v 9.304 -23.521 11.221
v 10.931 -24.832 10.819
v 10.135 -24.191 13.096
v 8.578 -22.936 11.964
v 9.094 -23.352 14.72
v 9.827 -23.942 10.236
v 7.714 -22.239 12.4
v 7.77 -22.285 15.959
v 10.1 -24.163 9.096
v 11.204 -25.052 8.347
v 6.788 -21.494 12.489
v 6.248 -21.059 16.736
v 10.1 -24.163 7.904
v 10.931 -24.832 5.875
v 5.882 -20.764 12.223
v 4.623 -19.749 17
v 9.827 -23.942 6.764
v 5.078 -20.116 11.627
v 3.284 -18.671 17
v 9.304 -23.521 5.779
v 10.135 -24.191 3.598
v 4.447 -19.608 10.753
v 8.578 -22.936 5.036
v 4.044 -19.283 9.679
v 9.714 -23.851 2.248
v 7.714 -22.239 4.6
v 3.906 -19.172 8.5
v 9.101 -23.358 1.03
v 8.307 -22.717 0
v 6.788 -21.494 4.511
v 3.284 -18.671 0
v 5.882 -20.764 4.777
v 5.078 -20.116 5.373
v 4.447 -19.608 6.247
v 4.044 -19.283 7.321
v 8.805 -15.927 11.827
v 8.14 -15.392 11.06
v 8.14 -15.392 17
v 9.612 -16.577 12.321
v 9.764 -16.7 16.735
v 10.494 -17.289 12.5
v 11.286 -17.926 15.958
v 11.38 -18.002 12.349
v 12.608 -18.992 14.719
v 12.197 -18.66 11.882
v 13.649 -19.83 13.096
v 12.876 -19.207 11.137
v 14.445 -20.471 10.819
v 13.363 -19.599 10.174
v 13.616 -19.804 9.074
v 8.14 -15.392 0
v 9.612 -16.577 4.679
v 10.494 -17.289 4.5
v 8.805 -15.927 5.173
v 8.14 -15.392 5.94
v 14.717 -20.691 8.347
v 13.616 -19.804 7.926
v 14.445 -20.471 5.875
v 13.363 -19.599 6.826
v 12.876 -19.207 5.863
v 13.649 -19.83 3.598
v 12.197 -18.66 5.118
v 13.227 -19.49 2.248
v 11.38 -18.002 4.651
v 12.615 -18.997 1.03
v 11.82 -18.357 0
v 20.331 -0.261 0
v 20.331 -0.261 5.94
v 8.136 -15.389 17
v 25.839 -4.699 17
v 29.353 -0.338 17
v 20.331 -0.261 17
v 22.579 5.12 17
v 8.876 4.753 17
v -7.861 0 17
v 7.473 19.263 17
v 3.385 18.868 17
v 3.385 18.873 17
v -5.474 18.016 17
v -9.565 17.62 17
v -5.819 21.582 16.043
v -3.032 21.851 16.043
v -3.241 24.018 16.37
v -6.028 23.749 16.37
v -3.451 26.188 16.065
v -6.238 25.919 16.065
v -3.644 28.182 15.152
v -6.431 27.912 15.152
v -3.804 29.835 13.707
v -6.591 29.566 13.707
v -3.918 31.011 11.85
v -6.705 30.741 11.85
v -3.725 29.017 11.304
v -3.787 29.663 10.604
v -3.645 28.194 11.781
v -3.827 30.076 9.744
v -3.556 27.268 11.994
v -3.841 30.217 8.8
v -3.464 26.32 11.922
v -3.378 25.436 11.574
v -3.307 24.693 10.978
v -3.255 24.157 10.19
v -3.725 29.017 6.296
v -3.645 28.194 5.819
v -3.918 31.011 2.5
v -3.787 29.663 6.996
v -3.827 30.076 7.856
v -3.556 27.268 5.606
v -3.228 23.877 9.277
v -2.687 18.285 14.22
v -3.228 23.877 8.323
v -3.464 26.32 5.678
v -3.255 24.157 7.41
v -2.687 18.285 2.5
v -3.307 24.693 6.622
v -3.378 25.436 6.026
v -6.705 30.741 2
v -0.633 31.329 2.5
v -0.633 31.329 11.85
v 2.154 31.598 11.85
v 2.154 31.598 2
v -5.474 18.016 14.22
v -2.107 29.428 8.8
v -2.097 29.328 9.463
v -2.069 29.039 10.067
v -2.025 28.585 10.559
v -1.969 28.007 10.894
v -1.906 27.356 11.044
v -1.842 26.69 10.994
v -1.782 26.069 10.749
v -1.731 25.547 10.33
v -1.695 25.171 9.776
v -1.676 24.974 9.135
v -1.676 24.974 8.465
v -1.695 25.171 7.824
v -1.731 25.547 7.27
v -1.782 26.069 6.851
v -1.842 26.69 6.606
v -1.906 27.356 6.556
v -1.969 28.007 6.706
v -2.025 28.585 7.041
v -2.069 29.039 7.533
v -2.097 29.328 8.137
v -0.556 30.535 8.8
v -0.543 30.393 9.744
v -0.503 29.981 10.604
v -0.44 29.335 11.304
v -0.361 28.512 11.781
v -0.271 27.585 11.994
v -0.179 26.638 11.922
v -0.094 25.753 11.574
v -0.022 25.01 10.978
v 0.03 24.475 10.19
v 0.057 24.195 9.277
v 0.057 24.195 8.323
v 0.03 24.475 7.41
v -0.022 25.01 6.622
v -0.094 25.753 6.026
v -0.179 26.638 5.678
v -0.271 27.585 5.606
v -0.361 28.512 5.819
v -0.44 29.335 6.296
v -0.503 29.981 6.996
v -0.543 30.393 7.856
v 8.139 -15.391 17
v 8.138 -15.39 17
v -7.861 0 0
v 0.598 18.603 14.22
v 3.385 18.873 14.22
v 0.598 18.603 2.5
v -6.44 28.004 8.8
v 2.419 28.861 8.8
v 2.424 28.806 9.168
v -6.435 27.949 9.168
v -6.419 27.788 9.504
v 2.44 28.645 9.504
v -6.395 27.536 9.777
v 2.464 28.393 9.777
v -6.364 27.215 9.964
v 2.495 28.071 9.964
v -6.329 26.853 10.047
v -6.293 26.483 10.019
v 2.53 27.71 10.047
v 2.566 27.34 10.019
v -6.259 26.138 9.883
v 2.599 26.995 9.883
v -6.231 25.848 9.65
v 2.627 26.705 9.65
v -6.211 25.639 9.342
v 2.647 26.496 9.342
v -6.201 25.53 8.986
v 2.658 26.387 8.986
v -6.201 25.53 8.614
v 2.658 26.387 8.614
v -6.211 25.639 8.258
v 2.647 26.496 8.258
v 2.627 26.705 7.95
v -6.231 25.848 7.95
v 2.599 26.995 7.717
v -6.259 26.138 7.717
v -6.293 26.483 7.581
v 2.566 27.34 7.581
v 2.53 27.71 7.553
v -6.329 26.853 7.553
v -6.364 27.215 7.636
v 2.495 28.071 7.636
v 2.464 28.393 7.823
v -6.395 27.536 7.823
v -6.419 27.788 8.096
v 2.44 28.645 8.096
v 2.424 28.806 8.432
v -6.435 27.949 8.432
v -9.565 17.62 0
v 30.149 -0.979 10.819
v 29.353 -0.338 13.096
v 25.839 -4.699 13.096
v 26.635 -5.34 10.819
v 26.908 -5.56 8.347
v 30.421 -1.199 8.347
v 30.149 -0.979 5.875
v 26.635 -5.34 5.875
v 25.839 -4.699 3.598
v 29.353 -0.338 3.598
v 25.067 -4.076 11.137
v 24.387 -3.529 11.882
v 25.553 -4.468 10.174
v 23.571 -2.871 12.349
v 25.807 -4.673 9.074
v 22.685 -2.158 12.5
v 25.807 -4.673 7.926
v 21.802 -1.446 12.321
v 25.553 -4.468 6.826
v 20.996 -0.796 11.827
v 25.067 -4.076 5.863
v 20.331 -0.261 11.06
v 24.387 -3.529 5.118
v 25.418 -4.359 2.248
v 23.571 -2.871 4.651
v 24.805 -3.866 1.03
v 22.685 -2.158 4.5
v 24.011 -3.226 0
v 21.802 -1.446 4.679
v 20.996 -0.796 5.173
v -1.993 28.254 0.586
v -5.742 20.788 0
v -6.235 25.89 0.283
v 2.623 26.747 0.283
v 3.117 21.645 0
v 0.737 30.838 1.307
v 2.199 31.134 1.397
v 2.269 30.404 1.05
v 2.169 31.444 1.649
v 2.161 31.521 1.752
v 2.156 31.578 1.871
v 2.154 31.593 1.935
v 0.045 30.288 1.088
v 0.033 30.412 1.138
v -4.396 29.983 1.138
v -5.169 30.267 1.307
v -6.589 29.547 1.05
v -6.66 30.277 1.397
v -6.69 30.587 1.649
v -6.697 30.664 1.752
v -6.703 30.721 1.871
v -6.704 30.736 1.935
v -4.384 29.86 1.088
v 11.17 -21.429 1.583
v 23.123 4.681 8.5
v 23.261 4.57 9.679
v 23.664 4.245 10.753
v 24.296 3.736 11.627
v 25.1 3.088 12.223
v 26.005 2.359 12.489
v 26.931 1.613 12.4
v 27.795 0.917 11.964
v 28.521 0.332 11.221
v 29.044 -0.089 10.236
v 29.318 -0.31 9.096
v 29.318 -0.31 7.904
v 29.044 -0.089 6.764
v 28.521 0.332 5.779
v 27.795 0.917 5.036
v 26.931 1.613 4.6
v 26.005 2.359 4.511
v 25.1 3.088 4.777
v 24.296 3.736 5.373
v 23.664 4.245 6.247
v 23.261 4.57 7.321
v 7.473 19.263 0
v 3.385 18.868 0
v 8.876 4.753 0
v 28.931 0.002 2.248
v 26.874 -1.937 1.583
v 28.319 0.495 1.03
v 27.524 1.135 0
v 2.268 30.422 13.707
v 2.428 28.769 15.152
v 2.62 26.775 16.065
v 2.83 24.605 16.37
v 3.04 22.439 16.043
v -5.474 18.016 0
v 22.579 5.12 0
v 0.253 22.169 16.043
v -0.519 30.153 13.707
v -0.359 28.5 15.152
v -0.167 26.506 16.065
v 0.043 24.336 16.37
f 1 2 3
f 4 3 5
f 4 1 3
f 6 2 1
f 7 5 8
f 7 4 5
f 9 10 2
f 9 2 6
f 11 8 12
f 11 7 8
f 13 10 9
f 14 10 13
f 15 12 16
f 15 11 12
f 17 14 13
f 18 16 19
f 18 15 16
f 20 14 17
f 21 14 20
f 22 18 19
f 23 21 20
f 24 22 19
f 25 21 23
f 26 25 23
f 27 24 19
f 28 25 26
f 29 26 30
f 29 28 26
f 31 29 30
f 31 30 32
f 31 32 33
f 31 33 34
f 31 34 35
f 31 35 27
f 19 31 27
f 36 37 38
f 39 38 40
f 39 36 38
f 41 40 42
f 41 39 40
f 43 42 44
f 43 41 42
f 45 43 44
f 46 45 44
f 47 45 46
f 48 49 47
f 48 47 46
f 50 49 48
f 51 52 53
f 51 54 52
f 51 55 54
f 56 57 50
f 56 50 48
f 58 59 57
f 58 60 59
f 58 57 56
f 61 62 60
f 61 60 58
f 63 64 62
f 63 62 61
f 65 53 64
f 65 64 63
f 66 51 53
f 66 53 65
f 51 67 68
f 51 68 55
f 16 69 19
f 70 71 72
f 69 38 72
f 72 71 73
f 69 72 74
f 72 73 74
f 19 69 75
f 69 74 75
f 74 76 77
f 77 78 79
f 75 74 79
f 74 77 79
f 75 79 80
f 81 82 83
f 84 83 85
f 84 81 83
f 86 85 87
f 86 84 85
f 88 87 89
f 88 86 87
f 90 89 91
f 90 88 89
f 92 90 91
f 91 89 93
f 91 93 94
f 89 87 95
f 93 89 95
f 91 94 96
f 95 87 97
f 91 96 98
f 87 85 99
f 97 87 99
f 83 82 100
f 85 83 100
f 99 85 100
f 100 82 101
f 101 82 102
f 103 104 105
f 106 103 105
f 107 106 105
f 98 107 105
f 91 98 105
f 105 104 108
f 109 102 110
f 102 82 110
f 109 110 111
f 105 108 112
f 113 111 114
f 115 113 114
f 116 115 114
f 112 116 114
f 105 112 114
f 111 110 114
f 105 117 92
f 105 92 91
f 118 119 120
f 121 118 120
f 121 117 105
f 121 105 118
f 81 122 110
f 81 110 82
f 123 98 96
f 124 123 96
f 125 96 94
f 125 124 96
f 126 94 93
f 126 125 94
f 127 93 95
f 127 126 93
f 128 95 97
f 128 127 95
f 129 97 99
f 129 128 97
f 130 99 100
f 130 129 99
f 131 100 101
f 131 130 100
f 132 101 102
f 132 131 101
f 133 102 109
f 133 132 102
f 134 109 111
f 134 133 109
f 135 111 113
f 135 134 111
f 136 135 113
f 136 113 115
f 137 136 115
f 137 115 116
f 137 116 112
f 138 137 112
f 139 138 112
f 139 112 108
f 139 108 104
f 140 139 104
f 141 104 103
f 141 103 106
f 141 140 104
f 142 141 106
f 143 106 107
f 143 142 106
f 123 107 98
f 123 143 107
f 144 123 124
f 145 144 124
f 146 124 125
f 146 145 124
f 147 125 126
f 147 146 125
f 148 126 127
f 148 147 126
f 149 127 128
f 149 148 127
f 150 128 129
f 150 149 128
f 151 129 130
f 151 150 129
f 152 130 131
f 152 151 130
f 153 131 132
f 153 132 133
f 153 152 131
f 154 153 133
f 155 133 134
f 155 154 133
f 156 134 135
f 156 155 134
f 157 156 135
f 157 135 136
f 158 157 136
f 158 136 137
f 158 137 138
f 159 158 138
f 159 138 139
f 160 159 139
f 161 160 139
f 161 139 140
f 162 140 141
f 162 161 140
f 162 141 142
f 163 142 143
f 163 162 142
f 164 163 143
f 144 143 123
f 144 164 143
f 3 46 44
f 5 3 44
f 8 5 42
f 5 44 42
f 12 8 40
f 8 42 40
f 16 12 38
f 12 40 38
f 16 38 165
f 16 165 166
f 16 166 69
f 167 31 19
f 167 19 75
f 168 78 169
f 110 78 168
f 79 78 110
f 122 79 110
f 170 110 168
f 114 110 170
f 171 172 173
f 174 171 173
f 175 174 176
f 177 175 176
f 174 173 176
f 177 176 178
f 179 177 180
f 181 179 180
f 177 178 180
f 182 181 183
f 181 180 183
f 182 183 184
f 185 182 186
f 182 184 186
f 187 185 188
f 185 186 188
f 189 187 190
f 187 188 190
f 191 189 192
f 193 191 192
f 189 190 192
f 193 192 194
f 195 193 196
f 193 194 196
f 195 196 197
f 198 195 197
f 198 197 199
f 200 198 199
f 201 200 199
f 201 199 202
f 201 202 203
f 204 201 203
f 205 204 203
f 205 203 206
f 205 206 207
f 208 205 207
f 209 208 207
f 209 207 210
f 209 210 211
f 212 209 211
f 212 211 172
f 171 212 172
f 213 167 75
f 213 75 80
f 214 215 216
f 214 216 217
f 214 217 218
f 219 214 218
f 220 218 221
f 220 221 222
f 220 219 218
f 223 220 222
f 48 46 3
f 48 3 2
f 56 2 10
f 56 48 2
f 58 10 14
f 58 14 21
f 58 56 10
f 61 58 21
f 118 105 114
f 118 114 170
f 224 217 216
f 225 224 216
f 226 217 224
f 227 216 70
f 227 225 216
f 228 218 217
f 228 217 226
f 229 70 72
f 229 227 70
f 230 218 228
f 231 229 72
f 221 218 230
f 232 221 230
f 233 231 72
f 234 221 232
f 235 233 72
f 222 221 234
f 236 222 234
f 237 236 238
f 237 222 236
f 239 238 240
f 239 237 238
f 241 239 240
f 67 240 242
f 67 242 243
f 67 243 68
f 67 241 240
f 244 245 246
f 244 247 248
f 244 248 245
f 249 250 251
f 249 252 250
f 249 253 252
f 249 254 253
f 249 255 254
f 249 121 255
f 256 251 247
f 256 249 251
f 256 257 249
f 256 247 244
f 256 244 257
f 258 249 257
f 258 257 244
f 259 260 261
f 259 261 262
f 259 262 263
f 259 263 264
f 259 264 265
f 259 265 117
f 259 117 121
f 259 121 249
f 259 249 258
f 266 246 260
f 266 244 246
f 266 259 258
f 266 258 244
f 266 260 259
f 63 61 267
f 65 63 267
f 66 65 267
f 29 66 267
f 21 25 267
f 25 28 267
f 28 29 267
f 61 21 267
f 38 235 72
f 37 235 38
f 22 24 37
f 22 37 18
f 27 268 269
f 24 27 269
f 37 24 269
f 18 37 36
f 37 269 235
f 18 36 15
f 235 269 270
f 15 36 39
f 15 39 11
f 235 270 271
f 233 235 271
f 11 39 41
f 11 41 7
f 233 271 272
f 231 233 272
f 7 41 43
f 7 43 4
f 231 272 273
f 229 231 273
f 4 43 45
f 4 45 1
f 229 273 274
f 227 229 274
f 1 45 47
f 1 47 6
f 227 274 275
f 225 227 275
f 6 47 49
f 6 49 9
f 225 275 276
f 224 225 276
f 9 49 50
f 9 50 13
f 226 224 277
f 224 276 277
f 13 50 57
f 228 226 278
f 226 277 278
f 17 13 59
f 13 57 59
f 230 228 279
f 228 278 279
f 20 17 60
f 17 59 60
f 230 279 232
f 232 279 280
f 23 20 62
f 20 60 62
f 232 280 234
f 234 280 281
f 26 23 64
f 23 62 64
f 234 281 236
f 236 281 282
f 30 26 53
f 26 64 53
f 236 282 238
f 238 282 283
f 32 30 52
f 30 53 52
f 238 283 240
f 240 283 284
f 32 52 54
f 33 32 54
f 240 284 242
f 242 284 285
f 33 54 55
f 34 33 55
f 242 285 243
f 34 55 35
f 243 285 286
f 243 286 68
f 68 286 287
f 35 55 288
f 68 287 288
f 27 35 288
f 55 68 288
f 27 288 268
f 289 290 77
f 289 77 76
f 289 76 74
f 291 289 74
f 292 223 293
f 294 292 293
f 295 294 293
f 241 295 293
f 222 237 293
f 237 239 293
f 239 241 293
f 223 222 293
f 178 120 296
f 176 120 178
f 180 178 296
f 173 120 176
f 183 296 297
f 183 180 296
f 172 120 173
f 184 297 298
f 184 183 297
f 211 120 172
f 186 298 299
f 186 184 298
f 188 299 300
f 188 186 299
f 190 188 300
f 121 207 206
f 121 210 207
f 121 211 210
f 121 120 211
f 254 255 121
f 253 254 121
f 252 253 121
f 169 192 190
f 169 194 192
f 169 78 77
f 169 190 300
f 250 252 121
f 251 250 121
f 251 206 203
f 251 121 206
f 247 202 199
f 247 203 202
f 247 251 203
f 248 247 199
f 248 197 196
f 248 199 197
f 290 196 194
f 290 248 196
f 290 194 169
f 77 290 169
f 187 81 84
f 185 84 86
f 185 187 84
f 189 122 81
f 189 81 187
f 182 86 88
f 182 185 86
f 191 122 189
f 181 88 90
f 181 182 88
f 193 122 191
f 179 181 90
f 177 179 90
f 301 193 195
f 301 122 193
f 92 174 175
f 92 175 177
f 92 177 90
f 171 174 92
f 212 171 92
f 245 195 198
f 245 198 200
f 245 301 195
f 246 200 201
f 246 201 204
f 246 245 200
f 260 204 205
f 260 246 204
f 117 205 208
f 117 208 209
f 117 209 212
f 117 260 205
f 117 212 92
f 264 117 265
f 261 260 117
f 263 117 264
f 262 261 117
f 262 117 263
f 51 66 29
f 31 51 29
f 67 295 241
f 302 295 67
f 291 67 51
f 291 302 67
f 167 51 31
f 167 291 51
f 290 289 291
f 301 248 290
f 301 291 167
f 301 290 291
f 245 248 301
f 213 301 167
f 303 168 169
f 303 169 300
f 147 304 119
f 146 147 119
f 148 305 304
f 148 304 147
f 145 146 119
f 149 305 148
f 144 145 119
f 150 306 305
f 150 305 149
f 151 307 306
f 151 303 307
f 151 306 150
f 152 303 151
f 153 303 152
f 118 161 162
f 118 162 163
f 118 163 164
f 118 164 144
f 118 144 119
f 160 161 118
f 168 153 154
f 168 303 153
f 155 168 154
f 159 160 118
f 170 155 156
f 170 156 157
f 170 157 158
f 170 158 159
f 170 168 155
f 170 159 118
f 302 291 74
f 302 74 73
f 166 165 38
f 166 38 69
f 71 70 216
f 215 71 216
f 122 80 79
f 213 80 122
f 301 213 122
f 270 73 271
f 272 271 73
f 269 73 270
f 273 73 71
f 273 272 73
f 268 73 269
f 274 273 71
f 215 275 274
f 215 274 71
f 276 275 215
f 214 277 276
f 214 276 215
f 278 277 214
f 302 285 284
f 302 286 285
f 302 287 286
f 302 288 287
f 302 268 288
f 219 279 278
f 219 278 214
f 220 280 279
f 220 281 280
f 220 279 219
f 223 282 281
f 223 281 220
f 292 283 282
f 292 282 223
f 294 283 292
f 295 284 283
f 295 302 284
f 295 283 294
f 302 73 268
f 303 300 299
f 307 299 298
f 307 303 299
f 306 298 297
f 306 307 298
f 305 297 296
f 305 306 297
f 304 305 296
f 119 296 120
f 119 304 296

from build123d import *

# Parameters (mm, degrees)
BOSS_EXTRUDE1_DEPTH     = 17
CUT_EXTRUDE1_DEPTH      = 15
CUT_EXTRUDE2_DEPTH      = 46.197309304
CUT_EXTRUDE2_DEPTH_BACK = 46.197309304
CUT_EXTRUDE3_DEPTH      = 12
SKETCH6_R               = 4
CUT_EXTRUDE4_DEPTH      = 35
CUT_EXTRUDE5_START      = -12.78511231
CUT_EXTRUDE5_OUTLINE_W  = 3.3
CUT_EXTRUDE5_OUTLINE_H  = 13.870481222
CUT_EXTRUDE5_DEPTH      = 12.78511231
SKETCH8_R               = 1.25
CUT_EXTRUDE6_DEPTH      = 15
SKETCH10_R              = 1.25
CUT_EXTRUDE7_DEPTH      = 15
FILLET1_SIZE            = 2
FILLET1_SIZE_2          = 10


# Read off the part's stored shape, not the designer's step: Cut-Extrude5, Extrude-Thin1
with BuildPart() as part:
    # Sketch1 → Boss-Extrude1 (new body)
    with BuildSketch(Plane.XY):
        Polygon((-9.564728379, 17.62000192), (-5.473819301, 18.015682238), (-6.704675095, 30.741407789), (2.153984466, 31.598233783), (3.38531081, 18.867643246), (7.473335954, 19.262913811), (8.876277245, 4.753208867), (22.578615379, 5.119591375), (30.743737203, -1.458779689), (27.230396467, -5.819563663), (20.33101325, -0.260956714), (8.140408694, -15.392023407), (15.036201119, -20.947737373), (11.522860383, -25.308521347), (3.283942394, -18.670695131), (-7.860727511, 0), align=None)
    extrude(amount=BOSS_EXTRUDE1_DEPTH)

    # Sketch3 → Cut-Extrude1 (cut)
    with BuildSketch(Plane(origin=(-3.696725775, -0.357554178, 0), x_dir=(0, 0, 1), z_dir=(-0.9953550068413657, -0.09627258361457379, 0))):
        with BuildLine():
            Line((0, 31.244090554), (0, 32.721435634))
            Line((0, 32.721435634), (17.68, 32.721435634))
            Line((17.68, 32.721435634), (17.68, 18.458978244))
            Line((17.68, 18.458978244), (14.22, 18.458978244))
            Line((14.22, 18.458978244), (16.043166109, 22.04177957))
            ThreePointArc((16.043166109, 22.04177957), (15.680947079, 27.433223117), (11.85, 31.244090554))
            Line((11.85, 31.244090554), (0, 31.244090554))
        make_face()
    extrude(amount=-CUT_EXTRUDE1_DEPTH, mode=Mode.SUBTRACT)

    # Sketch4 → Cut-Extrude2 (cut, two sides: drawn at the far end of the back side and taken through both)
    with BuildSketch(Plane(origin=(7.87496966, 9.774469394, 0), x_dir=(0.7787114240648987, -0.6273822742402098, 0), z_dir=(-0.6273822742402096, -0.7787114240648986, 0)).offset(-CUT_EXTRUDE2_DEPTH_BACK)):
        Polygon((15.990906633, 19.904885529), (15.990906633, 16.999999998), (15.995711897, 16.999999998), (23.069210216, 16.999999998), (24.855711897, 17), (24.855711897, 0), (20.721010741, 0), (15.995711897, -2e-09), (15.990906633, -2e-09), (15.990906633, -2.308790515), (29.141254547, -2.308790515), (29.141254547, 19.904885529), align=None)
        with BuildLine():
            Line((24.855711897, 17), (23.069210216, 17))
            Line((23.069210216, 16.999999998), (23.069210216, 13.096000073))
            ThreePointArc((23.069210216, 13.096000073), (24.441573822, 8.347001118), (23.069216362, 3.598000386))
            add(Edge.make_bspline(
                [(20.721010741, -2e-09), (22.390075827, 1.367964254), (23.069216362, 3.598000386)],
                knots=[0, 0, 0, 1, 1, 1], degree=2))
            Line((20.721010741, 0), (24.855711897, 0))
            Line((24.855711897, 0), (24.855711897, 17))
        make_face()
    extrude(amount=CUT_EXTRUDE2_DEPTH + CUT_EXTRUDE2_DEPTH_BACK, mode=Mode.SUBTRACT)

    # Sketch5 → Cut-Extrude3 (cut)
    with BuildSketch(Plane(origin=(-4.315634896, -5.356597299, 0), x_dir=(0.7787114240649037, -0.6273822742402033, 0), z_dir=(0.6273822742402033, 0.7787114240649037, 0))):
        with BuildLine():
            Line((15.990245326, -16.999999999), (23.069210216, -16.999999999))
            Line((23.069210216, -16.999999999), (23.069210216, -13.096000073))
            ThreePointArc((23.069210216, -13.096000073), (20.032304179, -15.959301473), (15.990245326, -16.999999999))
        make_face()
    extrude(amount=-CUT_EXTRUDE3_DEPTH, mode=Mode.SUBTRACT)

    # Sketch6 → Cut-Extrude4 (cut)
    with BuildSketch(Plane(origin=(11.388310395, 14.135253369, 0), x_dir=(0.7787114240649039, -0.6273822742402033, 0), z_dir=(0.6273822742402032, 0.7787114240649039, 0))):
        with Locations(Location((19.069210216, -8.499999999, 0), (0, 0, 180))):
            Circle(SKETCH6_R)
    extrude(amount=-CUT_EXTRUDE4_DEPTH, mode=Mode.SUBTRACT)

    # Cut-Extrude5 outline → Cut-Extrude5 (cut)
    with BuildSketch(Plane(origin=(-3.00794932, 31.098961967, 0), x_dir=(0.995355006841366, 0.0962725836145697, 0), z_dir=(-0.0962725836145697, 0.995355006841366, 0)).offset(CUT_EXTRUDE5_START)):
        with Locations((0.736022827, -9.435240611)):
            Rectangle(CUT_EXTRUDE5_OUTLINE_W, CUT_EXTRUDE5_OUTLINE_H)
    extrude(amount=CUT_EXTRUDE5_DEPTH, mode=Mode.SUBTRACT)

    # Sketch8 → Cut-Extrude6 (cut)
    with BuildSketch(Plane(origin=(5.161933786, 0.499271816, 0), x_dir=(0, 0, -1), z_dir=(0.9953550068413664, 0.09627258361456668, 0))):
        with Locations(Location((-8.8, 27.244090554, 0), (0, 0, 90))):
            Circle(SKETCH8_R)
    extrude(amount=-CUT_EXTRUDE6_DEPTH, mode=Mode.SUBTRACT)

    # Extrude-Thin1 outline → Extrude-Thin1 (revolve)
    with BuildSketch(Plane(origin=(-2.622858986, 27.11754194, 8.8), x_dir=(-0.0962725836145697, 0.9953550068413659, 0), z_dir=(0, 0, -1))):
        Polygon((1.25, 0.736022827), (0.297372056, -0.913977173), (3.202627944, -0.913977173), (2.25, 0.736022827), (3.202627944, 2.386022827), (0.297372056, 2.386022827), align=None)
    revolve(axis=Axis((-2.622858986, 27.11754194, 8.8), (0.9953550068413659, 0.0962725836145697, 0)))

    # Sketch10 → Cut-Extrude7 (cut)
    with BuildSketch(Plane(origin=(5.161933786, 0.499271816, 0), x_dir=(0, 0, -1), z_dir=(0.9953550068413664, 0.09627258361456668, 0))):
        with Locations(Location((-8.8, 27.244090554, 0), (0, 0, 90))):
            Circle(SKETCH10_R)
    extrude(amount=-CUT_EXTRUDE7_DEPTH, mode=Mode.SUBTRACT)

    # Fillet1
    # an asymmetric fillet: 10, 2 mm, written as the material it takes off along each edge
    with BuildSketch(Plane(origin=(-31.588550266, 28.334593199, 0), x_dir=(0, 0, 1), z_dir=(0.995355006841366, 0.0962725836145696, 0))) as fillet1_piece_1:
        with BuildLine():
            Bezier((FILLET1_SIZE, 0), (0, 0), (0, FILLET1_SIZE_2), weights=[1, 0.707106781, 1])
            Line((0, FILLET1_SIZE_2), (0, 0))
            Line((0, 0), (FILLET1_SIZE, 0))
        make_face()
    extrude(amount=58.9, mode=Mode.SUBTRACT)


solid = part.part
